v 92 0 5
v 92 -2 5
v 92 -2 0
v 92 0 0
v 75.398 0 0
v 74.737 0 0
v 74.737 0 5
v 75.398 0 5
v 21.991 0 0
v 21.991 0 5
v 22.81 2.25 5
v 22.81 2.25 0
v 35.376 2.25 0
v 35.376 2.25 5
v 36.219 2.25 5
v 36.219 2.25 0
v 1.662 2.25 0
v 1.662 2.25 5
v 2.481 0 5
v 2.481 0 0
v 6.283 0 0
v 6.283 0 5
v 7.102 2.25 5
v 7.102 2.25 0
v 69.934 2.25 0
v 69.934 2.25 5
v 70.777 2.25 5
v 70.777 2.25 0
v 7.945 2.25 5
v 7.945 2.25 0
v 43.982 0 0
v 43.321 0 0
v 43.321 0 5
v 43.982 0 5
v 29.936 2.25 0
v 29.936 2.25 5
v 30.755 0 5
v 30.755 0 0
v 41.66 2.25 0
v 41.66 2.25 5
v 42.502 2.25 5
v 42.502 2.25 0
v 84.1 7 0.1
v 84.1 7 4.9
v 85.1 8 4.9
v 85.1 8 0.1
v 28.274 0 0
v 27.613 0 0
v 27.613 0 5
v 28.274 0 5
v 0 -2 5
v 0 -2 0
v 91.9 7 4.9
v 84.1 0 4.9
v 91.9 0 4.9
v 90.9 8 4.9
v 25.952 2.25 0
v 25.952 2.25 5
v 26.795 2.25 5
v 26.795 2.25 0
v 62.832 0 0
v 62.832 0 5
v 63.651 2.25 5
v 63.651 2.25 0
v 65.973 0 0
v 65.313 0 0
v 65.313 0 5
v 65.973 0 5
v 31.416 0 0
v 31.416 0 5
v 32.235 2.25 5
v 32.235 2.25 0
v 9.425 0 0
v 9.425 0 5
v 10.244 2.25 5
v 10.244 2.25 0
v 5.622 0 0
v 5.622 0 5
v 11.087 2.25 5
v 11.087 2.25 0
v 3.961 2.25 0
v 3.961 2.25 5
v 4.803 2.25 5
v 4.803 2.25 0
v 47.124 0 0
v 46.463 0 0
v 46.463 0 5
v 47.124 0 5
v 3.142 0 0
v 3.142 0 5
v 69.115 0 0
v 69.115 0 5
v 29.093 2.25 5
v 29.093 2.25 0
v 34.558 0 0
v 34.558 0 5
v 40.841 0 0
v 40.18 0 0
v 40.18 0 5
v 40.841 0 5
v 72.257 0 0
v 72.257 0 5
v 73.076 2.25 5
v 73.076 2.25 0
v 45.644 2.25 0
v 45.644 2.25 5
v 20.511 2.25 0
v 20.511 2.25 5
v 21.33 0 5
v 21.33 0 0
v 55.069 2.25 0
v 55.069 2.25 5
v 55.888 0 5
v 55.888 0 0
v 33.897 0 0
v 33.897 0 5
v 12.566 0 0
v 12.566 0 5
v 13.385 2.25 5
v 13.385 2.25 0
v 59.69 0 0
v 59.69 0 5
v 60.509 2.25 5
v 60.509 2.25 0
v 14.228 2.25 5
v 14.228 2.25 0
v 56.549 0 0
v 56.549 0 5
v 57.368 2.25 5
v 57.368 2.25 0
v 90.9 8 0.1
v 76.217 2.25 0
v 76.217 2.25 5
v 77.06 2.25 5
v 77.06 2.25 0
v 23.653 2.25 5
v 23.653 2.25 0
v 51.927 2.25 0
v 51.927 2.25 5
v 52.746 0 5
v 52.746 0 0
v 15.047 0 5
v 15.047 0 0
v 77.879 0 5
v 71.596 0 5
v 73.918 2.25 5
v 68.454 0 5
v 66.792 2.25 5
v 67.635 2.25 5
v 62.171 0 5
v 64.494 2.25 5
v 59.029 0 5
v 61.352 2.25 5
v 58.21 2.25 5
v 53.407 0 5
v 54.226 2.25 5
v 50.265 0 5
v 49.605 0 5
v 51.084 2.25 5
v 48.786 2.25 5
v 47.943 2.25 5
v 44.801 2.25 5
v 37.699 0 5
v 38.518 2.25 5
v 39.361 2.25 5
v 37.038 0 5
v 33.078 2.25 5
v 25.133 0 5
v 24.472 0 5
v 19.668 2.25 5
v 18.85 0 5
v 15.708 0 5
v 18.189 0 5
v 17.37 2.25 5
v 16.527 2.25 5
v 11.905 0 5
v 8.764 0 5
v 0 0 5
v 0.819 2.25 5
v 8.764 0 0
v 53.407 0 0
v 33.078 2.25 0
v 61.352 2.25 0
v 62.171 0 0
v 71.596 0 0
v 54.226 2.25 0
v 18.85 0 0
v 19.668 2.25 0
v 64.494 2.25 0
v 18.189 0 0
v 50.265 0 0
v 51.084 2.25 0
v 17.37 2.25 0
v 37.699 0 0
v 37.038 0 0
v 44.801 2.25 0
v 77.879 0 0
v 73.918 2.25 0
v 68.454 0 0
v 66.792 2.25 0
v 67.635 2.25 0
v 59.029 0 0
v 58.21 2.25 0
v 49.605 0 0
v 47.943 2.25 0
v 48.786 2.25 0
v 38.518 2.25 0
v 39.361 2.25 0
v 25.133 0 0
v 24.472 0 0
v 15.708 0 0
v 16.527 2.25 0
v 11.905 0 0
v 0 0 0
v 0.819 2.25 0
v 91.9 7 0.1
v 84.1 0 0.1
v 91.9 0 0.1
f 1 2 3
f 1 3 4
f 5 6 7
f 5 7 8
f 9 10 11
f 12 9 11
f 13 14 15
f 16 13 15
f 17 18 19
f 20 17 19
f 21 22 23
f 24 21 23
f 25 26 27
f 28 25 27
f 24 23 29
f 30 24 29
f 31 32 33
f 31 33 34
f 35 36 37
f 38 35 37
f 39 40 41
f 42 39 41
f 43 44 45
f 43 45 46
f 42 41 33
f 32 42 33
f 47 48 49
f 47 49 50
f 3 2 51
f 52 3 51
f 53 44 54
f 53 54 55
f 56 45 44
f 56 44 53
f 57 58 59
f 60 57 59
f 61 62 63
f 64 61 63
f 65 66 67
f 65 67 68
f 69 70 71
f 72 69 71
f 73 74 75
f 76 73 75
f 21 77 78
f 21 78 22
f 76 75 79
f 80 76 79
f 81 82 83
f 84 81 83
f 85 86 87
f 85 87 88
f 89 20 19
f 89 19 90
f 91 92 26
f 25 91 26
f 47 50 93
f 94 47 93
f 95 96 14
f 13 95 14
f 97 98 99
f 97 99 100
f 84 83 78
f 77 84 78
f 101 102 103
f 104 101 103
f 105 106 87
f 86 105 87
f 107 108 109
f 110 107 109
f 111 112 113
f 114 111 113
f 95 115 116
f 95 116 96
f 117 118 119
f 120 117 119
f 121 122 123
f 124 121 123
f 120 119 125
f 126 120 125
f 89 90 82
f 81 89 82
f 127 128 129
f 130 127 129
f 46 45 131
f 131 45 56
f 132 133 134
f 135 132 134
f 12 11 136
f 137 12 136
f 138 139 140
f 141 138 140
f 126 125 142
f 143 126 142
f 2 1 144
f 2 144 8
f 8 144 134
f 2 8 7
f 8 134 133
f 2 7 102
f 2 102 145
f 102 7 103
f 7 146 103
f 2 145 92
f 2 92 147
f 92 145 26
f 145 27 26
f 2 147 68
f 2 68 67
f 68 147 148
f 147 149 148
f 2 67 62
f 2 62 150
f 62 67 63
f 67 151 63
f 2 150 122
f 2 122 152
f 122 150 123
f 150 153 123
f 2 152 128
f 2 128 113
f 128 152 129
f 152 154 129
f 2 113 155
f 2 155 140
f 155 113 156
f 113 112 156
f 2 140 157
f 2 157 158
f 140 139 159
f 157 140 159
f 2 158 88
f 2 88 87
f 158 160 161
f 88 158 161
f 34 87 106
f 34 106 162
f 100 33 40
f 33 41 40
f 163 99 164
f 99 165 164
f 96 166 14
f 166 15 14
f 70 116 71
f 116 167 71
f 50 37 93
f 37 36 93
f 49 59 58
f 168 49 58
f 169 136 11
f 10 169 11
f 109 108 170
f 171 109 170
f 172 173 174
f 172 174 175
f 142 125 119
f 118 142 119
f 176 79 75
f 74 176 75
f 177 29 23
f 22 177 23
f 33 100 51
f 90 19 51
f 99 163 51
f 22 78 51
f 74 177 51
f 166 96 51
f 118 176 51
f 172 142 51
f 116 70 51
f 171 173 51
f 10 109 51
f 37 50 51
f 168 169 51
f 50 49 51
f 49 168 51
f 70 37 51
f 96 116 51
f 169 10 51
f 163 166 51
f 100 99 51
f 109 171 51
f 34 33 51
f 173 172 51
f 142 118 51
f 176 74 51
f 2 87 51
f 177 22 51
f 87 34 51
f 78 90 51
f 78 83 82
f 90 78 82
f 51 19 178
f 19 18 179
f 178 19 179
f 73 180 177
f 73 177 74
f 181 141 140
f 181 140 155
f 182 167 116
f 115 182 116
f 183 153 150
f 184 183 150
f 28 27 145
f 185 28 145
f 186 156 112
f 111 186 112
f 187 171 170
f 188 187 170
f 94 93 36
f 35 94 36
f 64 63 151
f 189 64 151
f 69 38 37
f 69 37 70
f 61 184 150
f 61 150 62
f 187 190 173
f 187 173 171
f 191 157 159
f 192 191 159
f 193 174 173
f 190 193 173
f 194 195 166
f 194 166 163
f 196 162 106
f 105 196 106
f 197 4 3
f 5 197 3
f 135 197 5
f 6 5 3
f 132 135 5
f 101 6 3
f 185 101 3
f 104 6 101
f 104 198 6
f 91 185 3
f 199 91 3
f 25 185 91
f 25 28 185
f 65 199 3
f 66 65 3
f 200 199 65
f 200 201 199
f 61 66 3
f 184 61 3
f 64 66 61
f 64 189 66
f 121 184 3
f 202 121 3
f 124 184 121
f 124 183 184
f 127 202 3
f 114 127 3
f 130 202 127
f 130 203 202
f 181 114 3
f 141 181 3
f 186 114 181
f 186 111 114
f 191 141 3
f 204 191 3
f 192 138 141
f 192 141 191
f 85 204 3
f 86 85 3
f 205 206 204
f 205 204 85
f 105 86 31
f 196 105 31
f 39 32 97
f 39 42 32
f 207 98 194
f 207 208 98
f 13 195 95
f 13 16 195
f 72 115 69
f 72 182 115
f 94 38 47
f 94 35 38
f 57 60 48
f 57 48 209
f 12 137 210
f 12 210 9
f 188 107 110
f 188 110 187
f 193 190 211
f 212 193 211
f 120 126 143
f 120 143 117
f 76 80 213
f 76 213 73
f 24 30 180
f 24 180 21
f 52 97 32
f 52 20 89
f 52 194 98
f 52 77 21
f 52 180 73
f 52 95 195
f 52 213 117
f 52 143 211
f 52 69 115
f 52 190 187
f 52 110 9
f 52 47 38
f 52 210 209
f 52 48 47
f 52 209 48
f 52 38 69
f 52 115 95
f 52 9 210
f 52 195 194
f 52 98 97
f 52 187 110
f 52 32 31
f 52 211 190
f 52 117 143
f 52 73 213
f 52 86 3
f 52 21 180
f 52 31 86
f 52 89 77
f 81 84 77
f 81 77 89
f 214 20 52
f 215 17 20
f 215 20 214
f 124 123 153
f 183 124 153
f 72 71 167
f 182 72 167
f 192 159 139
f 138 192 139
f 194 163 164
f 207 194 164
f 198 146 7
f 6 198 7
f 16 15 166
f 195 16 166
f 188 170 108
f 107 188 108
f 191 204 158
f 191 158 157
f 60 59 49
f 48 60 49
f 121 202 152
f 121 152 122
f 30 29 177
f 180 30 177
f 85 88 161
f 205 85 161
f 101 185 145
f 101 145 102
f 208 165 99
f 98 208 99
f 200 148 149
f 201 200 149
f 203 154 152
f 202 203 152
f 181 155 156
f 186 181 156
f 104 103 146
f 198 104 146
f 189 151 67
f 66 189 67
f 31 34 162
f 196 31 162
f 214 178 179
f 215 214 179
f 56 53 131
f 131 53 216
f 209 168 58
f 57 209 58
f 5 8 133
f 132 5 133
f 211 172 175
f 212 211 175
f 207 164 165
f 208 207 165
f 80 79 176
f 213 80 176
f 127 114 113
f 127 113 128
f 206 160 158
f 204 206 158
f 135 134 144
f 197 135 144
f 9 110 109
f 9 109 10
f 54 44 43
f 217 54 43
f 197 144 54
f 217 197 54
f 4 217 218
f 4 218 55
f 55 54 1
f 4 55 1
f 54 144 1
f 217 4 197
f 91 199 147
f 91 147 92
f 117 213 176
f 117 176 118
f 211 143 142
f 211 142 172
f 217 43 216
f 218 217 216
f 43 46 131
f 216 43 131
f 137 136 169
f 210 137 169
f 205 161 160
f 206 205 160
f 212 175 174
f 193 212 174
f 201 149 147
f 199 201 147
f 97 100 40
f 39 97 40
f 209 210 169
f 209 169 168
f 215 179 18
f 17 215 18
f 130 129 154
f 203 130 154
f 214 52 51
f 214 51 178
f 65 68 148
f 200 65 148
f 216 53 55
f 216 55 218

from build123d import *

# Parameters (mm, degrees)
SKETCH_1_W             = 80
SKETCH_1_H             = 10
EXTRUDE_1_DEPTH        = 5
EXTRUDE_2_DEPTH        = 5
PATTERN_LINEAR_1_COUNT = 25
PATTERN_LINEAR_1_PITCH = 3.141592654
SKETCH_3_W             = 80
SKETCH_3_H             = 8
CUT_EXTRUDE_1_DEPTH    = 10
EXTRUDE_1_2_DEPTH      = 5
SKETCH_5_W             = 8
SKETCH_5_H             = 5
SKETCH_5_W_2           = 7.8
SKETCH_5_H_2           = 4.8
CUT_EXTRUDE_3_DEPTH    = 8
CHAMFER_1_SIZE         = 1


with BuildPart() as part:
    # 草图1 → Extrude 1 (new body)
    with BuildSketch(Plane.XY):
        with Locations((40, -5)):
            Rectangle(SKETCH_1_W, SKETCH_1_H)
    extrude(amount=EXTRUDE_1_DEPTH)

    # 草图2 → 拉伸2 (add)
    with BuildSketch(Plane.XY.offset(5)):
        Polygon((0, 0), (0.818933027, 2.25), (1.661788885, 2.25), (2.480721912, 0), align=None)
    extrude_2 = extrude(amount=-EXTRUDE_2_DEPTH)

    # 阵列(线性)1: 拉伸2 ×25
    with Locations(*[(i * PATTERN_LINEAR_1_PITCH, 0, 0) for i in range(1, PATTERN_LINEAR_1_COUNT)]):
        add(extrude_2)

    # 草图3 → 切除-拉伸1 (cut)
    with BuildSketch(Plane.XY.offset(5)):
        with Locations((40, -6)):
            Rectangle(SKETCH_3_W, SKETCH_3_H)
    extrude(amount=-CUT_EXTRUDE_1_DEPTH, mode=Mode.SUBTRACT)

    # 草图4 → Extrude 1 2 (add)
    with BuildSketch(Plane.XY.offset(5)):
        Polygon((80, 0), (84, 0), (84, 8), (92, 8), (92, 0), (92, -2), (80, -2), align=None)
    extrude(amount=-EXTRUDE_1_2_DEPTH)

    # 草图5 → 切除-拉伸3 (cut)
    with BuildSketch(Plane(origin=(0, 8, 0), x_dir=(1, 0, 0), z_dir=(0, 1, 0))):
        with Locations((88, -2.5)):
            Rectangle(SKETCH_5_W, SKETCH_5_H)
        with Locations((88, -2.5)):
            Rectangle(SKETCH_5_W_2, SKETCH_5_H_2, mode=Mode.SUBTRACT)
    extrude(amount=-CUT_EXTRUDE_3_DEPTH, mode=Mode.SUBTRACT)

    # 倒角1
    chamfer_1_edges = [part.edges().sort_by_distance(p)[0] for p in [
        (84.1, 8, 2.5),
        (91.9, 8, 2.5),
    ]]
    chamfer(chamfer_1_edges, length=CHAMFER_1_SIZE)


solid = part.part
